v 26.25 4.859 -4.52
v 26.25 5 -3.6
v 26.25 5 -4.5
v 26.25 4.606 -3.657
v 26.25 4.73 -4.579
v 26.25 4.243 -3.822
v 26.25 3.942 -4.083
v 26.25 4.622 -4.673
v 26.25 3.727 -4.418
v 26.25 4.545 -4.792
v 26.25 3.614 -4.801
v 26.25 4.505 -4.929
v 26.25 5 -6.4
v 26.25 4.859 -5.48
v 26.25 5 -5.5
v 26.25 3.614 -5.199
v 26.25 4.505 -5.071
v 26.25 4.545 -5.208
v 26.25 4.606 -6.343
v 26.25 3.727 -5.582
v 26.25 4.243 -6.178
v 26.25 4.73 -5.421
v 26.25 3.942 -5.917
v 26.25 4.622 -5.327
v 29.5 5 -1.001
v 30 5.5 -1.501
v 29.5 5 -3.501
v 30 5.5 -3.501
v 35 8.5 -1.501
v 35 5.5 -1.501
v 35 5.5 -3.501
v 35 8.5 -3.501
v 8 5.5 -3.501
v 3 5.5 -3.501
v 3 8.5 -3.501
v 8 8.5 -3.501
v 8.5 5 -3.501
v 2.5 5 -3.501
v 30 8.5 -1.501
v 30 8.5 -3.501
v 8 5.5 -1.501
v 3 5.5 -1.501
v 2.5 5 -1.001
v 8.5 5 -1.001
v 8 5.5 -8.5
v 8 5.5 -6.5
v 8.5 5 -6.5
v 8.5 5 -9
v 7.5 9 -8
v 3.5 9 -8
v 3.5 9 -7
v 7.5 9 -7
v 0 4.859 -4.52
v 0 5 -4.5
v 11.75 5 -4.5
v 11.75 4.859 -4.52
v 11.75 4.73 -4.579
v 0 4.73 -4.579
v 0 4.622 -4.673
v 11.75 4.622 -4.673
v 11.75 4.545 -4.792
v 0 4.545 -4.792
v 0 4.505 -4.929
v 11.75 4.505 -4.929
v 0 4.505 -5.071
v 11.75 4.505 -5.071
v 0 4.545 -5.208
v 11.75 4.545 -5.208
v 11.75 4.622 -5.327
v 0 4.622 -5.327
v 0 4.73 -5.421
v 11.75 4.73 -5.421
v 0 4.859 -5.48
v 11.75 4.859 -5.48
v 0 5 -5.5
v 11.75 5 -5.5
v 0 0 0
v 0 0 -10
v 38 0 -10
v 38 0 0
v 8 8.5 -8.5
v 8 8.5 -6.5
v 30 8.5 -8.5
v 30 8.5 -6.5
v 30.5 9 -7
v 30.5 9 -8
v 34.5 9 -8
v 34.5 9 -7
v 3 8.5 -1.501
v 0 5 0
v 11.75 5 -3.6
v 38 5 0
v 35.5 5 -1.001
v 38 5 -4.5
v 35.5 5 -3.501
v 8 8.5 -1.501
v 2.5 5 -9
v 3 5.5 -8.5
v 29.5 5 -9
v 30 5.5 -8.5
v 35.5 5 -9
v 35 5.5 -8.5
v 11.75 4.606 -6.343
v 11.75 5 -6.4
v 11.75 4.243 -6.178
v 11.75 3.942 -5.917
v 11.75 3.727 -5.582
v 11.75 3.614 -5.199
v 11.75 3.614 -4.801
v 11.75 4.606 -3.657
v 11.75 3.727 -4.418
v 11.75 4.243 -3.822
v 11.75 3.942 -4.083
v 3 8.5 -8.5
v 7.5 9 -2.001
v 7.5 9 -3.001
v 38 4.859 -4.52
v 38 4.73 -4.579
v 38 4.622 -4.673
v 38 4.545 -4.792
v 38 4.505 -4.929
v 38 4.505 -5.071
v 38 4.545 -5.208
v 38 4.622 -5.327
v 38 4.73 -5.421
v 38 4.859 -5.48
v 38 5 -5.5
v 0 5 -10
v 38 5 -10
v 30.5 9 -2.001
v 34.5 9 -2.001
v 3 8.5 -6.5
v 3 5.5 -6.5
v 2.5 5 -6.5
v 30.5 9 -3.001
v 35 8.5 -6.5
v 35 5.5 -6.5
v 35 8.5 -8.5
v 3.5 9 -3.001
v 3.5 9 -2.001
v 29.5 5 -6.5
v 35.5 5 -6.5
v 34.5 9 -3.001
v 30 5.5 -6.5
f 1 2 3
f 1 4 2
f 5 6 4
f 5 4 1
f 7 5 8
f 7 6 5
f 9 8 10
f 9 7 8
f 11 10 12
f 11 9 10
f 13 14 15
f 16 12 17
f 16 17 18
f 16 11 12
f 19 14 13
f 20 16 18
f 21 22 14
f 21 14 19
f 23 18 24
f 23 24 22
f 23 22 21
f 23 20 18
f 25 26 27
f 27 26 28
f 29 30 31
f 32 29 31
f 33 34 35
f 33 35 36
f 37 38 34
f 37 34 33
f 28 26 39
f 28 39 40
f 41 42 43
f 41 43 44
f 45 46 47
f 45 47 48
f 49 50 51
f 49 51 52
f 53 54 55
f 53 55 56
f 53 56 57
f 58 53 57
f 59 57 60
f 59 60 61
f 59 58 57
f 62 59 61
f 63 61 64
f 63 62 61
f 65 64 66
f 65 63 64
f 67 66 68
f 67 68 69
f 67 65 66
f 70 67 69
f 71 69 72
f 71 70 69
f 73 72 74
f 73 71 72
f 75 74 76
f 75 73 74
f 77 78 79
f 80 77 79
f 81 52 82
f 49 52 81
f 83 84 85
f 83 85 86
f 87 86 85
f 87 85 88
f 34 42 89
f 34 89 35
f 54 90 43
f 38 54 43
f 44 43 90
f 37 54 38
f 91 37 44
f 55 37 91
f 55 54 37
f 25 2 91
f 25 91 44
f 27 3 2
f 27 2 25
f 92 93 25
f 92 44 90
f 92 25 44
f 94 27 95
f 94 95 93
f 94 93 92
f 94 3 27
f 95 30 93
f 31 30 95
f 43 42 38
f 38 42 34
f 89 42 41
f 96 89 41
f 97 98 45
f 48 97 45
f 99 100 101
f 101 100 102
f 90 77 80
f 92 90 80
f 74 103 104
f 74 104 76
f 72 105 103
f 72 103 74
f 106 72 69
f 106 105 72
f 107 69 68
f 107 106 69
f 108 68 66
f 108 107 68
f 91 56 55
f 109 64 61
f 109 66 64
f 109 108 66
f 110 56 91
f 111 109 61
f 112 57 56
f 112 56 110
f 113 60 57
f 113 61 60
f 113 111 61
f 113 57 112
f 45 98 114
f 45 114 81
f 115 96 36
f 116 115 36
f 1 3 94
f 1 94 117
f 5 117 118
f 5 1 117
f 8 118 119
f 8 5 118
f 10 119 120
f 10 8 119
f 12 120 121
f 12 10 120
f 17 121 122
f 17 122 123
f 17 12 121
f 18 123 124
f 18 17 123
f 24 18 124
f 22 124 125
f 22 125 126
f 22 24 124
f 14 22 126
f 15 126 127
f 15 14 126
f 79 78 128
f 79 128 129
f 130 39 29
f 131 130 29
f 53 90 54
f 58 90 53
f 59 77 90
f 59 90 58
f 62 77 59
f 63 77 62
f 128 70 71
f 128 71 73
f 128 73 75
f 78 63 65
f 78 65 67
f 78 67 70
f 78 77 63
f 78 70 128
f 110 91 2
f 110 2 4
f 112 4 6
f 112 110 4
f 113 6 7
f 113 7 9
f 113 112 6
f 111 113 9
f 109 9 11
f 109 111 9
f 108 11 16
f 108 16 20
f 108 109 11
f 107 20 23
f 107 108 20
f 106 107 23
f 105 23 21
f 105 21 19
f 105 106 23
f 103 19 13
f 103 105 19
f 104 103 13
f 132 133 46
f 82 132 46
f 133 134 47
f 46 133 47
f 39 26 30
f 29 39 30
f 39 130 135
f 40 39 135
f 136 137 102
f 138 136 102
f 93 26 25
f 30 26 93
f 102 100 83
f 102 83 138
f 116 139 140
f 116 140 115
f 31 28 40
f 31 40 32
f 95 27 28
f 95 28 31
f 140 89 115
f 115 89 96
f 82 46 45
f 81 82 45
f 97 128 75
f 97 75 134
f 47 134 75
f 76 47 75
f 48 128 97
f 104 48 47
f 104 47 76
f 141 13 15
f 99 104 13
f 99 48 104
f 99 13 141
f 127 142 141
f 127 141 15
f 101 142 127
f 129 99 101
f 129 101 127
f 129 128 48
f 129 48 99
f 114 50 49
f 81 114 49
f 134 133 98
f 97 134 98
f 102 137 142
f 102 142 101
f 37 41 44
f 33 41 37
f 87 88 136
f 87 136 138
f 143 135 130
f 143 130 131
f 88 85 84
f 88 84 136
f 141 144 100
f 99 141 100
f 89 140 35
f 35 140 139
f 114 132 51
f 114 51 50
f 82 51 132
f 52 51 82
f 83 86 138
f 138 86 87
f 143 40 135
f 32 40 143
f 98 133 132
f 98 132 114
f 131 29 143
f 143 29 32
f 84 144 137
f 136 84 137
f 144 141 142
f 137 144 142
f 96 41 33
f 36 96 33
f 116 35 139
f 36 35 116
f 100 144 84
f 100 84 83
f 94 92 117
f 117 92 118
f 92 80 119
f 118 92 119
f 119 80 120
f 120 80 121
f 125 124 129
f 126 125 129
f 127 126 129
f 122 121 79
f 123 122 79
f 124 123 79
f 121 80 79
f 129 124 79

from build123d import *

# Parameters (mm, degrees)
SKETCH1_W           = 38
SKETCH1_H           = 10
BOSS_EXTRUDE1_DEPTH = 5
SKETCH3_W           = 5
SKETCH3_H           = 2
BOSS_EXTRUDE2_DEPTH = 4
CHAMFER1_SIZE       = 0.5
CHAMFER2_SIZE       = 0.5


with BuildPart() as part:
    # Sketch1 → Boss-Extrude1 (new body)
    with BuildSketch(Plane(origin=(0, 0, 0), x_dir=(1, 0, 0), z_dir=(0, 1, 0))):
        with Locations((19, 5)):
            Rectangle(SKETCH1_W, SKETCH1_H)
    extrude(amount=BOSS_EXTRUDE1_DEPTH)

    # Sketch2 → Cut-Revolve1 (revolve, cut)
    with BuildSketch(Plane(origin=(0, 5, 0), x_dir=(1, 0, 0), z_dir=(0, 1, 0))):
        Polygon((0, 5), (38, 5), (38, 4.5), (26.25, 4.5), (26.25, 3.6), (11.75, 3.6), (11.75, 4.5), (0, 4.5), align=None)
    revolve(axis=Axis((0, 5, -5), (1, 0, 0)), mode=Mode.SUBTRACT)

    # Sketch3 → Boss-Extrude2 (add)
    with BuildSketch(Plane(origin=(0, 5, 0), x_dir=(1, 0, 0), z_dir=(0, 1, 0))):
        with Locations((5.5, 7.5)):
            Rectangle(SKETCH3_W, SKETCH3_H)
        with Locations((32.5, 7.5)):
            Rectangle(SKETCH3_W, SKETCH3_H)
        with Locations((32.5, 2.500985925)):
            Rectangle(SKETCH3_W, SKETCH3_H)
        with Locations((5.5, 2.500985925)):
            Rectangle(SKETCH3_W, SKETCH3_H)
    extrude(amount=BOSS_EXTRUDE2_DEPTH)

    # Chamfer1
    chamfer1_edges = [part.edges().sort_by_distance(p)[0] for p in [
        (3, 5, -7.5),
        (8, 5, -7.5),
        (5.5, 5, -8.5),
        (30, 5, -7.5),
        (35, 5, -7.5),
        (32.5, 5, -8.5),
        (30, 5, -2.500985925),
        (32.5, 5, -1.500985925),
        (35, 5, -2.500985925),
        (3, 5, -2.500985925),
        (5.5, 5, -1.500985925),
        (8, 5, -2.500985925),
    ]]
    chamfer(chamfer1_edges, length=CHAMFER1_SIZE)

    # Chamfer2
    chamfer2_edges = [part.edges().sort_by_distance(p)[0] for p in [
        (3, 9, -7.5),
        (5.5, 9, -6.5),
        (8, 9, -7.5),
        (5.5, 9, -8.5),
        (30, 9, -7.5),
        (32.5, 9, -6.5),
        (35, 9, -7.5),
        (32.5, 9, -8.5),
        (30, 9, -2.500985925),
        (32.5, 9, -1.500985925),
        (35, 9, -2.500985925),
        (32.5, 9, -3.500985925),
        (3, 9, -2.500985925),
        (5.5, 9, -1.500985925),
        (8, 9, -2.500985925),
        (5.5, 9, -3.500985925),
    ]]
    chamfer(chamfer2_edges, length=CHAMFER2_SIZE)


solid = part.part
